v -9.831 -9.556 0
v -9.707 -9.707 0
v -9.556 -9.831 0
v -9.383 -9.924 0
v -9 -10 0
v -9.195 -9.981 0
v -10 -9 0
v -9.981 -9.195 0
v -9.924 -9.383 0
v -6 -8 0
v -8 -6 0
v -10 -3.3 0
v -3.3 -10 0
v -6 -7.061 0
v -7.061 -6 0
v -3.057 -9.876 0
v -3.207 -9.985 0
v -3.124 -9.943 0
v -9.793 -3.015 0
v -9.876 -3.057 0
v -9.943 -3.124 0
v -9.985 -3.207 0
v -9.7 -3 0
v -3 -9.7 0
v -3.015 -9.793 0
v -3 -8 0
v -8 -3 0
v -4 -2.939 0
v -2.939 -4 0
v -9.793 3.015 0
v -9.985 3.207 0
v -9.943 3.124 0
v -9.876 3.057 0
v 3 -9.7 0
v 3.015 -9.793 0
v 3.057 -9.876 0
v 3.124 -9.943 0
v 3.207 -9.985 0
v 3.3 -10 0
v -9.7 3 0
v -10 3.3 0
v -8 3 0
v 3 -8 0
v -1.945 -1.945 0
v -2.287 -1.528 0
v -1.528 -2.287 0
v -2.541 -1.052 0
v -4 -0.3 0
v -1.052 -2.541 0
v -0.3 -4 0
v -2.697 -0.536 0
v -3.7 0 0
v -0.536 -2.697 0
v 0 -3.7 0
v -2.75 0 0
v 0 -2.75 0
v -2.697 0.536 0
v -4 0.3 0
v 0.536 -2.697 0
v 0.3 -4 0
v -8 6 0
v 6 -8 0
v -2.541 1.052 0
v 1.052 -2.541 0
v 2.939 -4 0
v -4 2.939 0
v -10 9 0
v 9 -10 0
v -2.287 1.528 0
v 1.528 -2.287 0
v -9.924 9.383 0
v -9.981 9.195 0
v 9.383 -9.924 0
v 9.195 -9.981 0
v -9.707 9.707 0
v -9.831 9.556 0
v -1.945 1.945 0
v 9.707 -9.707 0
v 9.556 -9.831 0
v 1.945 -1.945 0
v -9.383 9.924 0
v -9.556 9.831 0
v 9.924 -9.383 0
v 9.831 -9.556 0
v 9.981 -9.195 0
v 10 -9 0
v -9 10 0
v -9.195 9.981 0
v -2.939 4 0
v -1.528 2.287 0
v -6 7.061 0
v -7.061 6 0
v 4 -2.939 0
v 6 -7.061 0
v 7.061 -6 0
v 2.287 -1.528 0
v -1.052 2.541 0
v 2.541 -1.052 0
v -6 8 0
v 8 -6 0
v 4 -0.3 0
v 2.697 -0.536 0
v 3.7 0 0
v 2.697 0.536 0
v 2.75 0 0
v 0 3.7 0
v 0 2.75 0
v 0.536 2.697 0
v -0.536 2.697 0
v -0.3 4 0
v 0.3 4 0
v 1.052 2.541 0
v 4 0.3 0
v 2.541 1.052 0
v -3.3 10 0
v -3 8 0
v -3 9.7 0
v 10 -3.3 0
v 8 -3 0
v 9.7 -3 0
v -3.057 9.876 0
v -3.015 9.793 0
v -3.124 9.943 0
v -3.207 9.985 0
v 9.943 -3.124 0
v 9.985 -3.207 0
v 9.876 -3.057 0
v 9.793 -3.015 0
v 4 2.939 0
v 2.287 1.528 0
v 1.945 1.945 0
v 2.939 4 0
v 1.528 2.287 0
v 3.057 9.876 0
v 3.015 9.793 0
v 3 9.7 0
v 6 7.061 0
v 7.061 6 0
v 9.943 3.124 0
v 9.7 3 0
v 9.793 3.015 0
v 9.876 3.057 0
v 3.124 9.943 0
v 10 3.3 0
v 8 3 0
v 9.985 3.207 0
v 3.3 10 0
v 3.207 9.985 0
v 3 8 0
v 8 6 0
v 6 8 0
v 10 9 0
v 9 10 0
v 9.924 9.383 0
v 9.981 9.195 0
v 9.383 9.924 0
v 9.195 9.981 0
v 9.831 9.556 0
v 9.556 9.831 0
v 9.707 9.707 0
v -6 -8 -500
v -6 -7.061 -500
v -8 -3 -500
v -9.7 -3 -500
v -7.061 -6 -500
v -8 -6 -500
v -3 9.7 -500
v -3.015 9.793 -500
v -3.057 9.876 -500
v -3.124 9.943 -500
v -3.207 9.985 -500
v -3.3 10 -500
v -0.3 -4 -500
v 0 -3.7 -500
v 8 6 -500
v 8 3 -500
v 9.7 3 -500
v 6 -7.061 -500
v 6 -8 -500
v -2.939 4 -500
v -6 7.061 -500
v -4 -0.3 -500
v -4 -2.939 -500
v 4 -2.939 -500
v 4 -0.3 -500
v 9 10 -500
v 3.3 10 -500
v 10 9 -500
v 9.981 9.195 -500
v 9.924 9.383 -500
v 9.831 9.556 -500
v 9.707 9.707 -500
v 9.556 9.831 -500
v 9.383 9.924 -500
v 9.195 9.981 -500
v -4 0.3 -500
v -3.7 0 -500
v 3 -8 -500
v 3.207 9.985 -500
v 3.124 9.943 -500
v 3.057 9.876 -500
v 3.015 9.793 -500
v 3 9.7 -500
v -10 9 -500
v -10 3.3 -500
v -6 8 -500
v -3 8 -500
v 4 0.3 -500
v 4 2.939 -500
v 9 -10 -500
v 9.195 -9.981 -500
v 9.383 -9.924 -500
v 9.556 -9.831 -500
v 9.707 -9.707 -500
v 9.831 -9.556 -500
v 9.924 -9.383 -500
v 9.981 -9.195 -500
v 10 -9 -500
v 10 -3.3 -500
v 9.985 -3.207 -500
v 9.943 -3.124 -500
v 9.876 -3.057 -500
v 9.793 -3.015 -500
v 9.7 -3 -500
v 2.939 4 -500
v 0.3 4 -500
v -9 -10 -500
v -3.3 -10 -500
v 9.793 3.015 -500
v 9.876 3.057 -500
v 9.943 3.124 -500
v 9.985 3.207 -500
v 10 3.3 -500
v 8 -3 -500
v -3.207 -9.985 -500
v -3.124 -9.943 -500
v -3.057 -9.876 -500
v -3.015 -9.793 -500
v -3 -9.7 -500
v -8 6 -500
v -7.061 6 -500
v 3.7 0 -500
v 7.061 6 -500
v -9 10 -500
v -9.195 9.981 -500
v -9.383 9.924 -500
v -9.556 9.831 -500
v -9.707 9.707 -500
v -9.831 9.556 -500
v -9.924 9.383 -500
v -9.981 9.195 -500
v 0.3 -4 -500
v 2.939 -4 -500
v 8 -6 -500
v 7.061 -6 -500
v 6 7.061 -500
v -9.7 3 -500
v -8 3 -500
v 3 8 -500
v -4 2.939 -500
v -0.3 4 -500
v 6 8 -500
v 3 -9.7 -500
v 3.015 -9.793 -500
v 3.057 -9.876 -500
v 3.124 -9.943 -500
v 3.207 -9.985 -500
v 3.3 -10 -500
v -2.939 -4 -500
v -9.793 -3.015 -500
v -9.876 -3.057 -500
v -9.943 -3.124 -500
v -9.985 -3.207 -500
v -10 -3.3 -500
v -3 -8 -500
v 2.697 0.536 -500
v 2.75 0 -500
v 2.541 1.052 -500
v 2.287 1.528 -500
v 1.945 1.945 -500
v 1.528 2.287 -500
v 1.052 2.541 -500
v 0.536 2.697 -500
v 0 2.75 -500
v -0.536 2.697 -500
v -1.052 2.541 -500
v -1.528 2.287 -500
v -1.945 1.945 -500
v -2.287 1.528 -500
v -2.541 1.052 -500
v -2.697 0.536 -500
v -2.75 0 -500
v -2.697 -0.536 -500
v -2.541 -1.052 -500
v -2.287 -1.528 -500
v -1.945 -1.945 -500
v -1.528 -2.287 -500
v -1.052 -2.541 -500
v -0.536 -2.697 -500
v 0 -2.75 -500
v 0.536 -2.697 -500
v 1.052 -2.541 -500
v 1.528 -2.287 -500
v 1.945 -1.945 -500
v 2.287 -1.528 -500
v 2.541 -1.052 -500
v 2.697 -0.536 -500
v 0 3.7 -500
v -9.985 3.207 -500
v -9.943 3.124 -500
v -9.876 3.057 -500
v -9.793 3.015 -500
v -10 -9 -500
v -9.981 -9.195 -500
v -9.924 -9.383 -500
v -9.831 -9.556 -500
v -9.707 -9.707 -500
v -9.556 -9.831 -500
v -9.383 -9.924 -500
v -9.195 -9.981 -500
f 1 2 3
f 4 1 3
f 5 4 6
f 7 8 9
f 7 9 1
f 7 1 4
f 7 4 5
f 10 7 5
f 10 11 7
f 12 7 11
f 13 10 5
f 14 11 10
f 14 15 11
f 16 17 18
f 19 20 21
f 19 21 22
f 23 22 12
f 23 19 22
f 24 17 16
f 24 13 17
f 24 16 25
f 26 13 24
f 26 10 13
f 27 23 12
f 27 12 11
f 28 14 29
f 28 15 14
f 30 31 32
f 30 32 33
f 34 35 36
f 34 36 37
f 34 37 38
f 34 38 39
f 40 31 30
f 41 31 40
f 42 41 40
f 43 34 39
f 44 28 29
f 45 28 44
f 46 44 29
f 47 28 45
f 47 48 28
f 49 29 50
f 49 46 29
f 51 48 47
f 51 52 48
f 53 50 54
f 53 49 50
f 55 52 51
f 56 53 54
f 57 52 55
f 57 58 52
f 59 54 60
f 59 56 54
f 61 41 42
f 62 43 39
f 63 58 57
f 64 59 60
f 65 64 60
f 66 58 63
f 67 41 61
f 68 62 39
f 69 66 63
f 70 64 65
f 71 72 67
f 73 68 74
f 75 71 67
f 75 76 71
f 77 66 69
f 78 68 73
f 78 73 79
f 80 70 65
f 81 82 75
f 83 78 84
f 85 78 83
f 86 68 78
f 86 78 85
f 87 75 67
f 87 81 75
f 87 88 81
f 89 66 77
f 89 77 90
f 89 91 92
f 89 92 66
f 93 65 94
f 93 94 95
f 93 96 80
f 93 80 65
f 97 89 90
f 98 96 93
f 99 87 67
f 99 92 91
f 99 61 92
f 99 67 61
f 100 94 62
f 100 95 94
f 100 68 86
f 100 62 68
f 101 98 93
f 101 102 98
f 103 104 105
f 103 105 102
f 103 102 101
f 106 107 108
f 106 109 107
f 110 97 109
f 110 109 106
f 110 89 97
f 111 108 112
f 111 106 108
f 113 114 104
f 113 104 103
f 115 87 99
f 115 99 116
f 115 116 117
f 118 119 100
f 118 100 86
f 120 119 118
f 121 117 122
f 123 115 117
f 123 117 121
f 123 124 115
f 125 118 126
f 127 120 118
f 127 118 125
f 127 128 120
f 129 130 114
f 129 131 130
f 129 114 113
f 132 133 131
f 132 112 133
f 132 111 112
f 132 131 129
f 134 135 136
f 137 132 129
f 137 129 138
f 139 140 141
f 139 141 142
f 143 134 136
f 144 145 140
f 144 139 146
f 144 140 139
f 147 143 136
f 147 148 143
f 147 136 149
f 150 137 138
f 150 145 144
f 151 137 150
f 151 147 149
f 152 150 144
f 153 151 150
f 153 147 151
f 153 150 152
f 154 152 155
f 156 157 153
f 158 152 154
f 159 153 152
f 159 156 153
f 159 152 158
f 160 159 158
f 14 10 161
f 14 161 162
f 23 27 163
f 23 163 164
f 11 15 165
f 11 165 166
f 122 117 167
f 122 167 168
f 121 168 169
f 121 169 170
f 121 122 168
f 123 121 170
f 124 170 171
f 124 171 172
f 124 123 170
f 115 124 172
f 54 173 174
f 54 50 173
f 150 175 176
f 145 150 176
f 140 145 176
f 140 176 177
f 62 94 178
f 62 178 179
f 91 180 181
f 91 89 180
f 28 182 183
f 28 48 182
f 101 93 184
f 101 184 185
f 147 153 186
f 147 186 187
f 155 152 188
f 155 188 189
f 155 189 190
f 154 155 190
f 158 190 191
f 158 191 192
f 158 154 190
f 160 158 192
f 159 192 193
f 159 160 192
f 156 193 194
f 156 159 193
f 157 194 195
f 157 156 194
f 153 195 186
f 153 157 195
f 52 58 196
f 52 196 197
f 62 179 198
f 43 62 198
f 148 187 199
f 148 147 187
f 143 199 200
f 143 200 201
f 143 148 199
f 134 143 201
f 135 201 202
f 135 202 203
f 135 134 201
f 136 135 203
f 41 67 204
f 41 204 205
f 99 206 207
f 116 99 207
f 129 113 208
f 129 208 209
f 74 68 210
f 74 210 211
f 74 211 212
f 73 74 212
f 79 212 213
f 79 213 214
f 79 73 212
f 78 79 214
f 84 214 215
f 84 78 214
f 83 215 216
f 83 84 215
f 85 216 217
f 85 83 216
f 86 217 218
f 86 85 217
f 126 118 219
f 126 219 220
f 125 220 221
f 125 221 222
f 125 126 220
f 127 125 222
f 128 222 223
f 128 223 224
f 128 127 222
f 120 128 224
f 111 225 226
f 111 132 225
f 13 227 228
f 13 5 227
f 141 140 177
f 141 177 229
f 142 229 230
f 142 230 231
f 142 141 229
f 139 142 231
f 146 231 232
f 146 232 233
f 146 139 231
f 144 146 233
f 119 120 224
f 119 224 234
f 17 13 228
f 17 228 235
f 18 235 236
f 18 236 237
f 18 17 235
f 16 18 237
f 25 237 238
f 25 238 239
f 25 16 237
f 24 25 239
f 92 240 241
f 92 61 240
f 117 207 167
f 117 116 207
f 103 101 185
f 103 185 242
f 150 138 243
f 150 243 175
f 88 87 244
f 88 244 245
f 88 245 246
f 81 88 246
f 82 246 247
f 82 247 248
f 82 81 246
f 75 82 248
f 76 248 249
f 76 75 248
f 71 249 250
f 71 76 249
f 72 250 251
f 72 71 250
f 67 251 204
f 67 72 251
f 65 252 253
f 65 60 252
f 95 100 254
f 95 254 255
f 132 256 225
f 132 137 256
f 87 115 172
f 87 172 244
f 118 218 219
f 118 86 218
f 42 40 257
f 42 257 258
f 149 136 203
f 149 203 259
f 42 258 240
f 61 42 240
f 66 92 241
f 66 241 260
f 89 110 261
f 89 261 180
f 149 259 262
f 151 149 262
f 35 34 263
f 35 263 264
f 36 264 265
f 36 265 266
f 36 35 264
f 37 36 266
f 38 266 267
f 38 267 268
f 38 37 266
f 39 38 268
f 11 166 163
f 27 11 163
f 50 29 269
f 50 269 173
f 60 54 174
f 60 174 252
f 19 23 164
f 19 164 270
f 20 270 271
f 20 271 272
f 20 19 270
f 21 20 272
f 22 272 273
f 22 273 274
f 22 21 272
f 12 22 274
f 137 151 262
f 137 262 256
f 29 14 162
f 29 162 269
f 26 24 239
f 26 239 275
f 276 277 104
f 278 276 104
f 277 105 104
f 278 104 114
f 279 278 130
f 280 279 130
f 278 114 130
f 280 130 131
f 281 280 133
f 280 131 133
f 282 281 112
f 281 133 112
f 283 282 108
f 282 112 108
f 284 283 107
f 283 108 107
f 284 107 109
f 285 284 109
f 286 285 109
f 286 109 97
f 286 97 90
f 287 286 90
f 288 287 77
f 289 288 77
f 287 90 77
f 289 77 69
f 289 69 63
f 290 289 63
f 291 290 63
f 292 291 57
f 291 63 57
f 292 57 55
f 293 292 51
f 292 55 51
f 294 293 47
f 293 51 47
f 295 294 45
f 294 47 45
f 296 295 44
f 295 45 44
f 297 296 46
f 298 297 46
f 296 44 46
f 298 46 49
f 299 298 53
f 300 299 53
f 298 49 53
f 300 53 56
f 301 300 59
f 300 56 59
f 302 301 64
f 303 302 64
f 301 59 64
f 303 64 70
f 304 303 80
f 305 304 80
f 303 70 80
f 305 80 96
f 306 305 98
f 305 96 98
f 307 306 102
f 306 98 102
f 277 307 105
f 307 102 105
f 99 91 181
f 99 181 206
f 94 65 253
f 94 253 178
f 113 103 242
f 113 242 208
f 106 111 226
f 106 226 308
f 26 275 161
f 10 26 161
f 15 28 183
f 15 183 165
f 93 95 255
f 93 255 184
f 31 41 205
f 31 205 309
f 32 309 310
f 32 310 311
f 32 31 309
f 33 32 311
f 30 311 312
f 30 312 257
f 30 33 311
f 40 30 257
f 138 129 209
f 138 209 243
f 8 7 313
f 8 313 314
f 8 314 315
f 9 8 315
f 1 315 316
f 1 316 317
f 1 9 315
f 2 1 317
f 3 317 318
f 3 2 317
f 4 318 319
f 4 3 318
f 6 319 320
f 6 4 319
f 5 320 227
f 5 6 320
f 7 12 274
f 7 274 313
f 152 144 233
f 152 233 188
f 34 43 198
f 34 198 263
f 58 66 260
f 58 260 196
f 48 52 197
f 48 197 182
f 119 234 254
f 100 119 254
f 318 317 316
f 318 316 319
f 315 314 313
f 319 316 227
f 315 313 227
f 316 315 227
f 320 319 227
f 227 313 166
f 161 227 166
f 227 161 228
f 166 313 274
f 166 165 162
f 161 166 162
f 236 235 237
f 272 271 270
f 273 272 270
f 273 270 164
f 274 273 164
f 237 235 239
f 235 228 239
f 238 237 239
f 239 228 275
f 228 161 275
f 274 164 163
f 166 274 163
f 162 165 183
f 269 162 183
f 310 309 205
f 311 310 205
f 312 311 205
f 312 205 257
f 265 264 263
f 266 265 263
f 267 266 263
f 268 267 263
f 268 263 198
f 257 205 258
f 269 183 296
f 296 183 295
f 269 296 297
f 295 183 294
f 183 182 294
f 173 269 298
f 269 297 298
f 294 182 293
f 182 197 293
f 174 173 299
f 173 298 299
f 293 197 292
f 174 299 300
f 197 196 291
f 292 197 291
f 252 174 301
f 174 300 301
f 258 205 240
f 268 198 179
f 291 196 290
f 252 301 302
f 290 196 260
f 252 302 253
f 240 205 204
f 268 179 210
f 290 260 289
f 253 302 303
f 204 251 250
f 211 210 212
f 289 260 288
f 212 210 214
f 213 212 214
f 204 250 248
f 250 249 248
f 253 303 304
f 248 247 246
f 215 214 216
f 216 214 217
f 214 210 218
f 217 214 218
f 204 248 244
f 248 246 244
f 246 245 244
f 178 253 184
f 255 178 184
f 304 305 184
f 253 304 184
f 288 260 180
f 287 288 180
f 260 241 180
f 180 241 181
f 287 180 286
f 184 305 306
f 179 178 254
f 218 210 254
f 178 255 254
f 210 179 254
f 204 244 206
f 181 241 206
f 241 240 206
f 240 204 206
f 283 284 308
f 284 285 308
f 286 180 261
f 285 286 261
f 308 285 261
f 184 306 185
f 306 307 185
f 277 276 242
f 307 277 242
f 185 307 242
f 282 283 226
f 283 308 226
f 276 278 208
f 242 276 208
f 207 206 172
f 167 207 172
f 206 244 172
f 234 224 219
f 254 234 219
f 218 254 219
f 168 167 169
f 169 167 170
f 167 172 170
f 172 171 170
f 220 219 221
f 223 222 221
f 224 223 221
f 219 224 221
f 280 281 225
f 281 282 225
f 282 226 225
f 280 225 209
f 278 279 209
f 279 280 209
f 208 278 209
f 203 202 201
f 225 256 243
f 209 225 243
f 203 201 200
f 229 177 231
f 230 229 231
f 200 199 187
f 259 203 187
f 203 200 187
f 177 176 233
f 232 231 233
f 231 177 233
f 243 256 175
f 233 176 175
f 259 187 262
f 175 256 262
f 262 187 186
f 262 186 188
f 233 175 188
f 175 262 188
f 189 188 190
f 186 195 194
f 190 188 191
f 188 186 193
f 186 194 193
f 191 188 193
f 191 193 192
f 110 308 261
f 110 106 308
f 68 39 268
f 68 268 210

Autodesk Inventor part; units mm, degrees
ref_plane "YZ Plane" through (0, 0, 0) normal (1, 0, 0) x (0, 1, 0)
ref_plane "XZ Plane" through (0, 0, 0) normal (0, 1, 0) x (-1, 0, 0)
ref_plane "XY Plane" through (0, 0, 0) normal (0, 0, 1) x (1, 0, 0)
sketch "Sketch_5" plane through (0, 0, 0) normal (0, 0, 1) x (1, 0, 0)
  line L0 (-10, 9) -> (-10, 3.3)
  arc A0 (-10, 3.3) -> (-9.7, 3) centre (-9.7, 3.3) ccw
  line L1 (-9.7, 3) -> (-8, 3)
  line L2 (-8, 3) -> (-8, 6)
  line L3 (-8, 6) -> (-7.0607, 6)
  line L4 (-7.0607, 6) -> (-4, 2.9393)
  line L5 (-4, 2.9393) -> (-4, 0.3)
  line L6 (-4, 0.3) -> (-3.7, 0)
  line L7 (-3.7, 0) -> (-4, -0.3)
  line L8 (-4, -0.3) -> (-4, -2.9393)
  line L9 (-4, -2.9393) -> (-7.0607, -6)
  line L10 (-7.0607, -6) -> (-8, -6)
  line L11 (-8, -6) -> (-8, -3)
  line L12 (-8, -3) -> (-9.7, -3)
  arc A1 (-9.7, -3) -> (-10, -3.3) centre (-9.7, -3.3) ccw
  line L13 (-10, -3.3) -> (-10, -9)
  arc A2 (-10, -9) -> (-9, -10) centre (-9, -9) ccw
  line L14 (-9, -10) -> (-3.3, -10)
  arc A3 (-3.3, -10) -> (-3, -9.7) centre (-3.3, -9.7) ccw
  line L15 (-3, -9.7) -> (-3, -8)
  line L16 (-3, -8) -> (-6, -8)
  line L17 (-6, -8) -> (-6, -7.0607)
  line L18 (-6, -7.0607) -> (-2.9393, -4)
  line L19 (-2.9393, -4) -> (-0.3, -4)
  line L20 (-0.3, -4) -> (0, -3.7)
  line L21 (0, -3.7) -> (0.3, -4)
  line L22 (0.3, -4) -> (2.9393, -4)
  line L23 (2.9393, -4) -> (6, -7.0607)
  line L24 (6, -7.0607) -> (6, -8)
  line L25 (6, -8) -> (3, -8)
  line L26 (3, -8) -> (3, -9.7)
  arc A4 (3, -9.7) -> (3.3, -10) centre (3.3, -9.7) ccw
  line L27 (3.3, -10) -> (9, -10)
  arc A5 (9, -10) -> (10, -9) centre (9, -9) ccw
  line L28 (10, -9) -> (10, -3.3)
  arc A6 (10, -3.3) -> (9.7, -3) centre (9.7, -3.3) ccw
  line L29 (9.7, -3) -> (8, -3)
  line L30 (8, -3) -> (8, -6)
  line L31 (8, -6) -> (7.0607, -6)
  line L32 (7.0607, -6) -> (4, -2.9393)
  line L33 (4, -2.9393) -> (4, -0.3)
  line L34 (4, -0.3) -> (3.7, 0)
  line L35 (3.7, 0) -> (4, 0.3)
  line L36 (4, 0.3) -> (4, 2.9393)
  line L37 (4, 2.9393) -> (7.0607, 6)
  line L38 (7.0607, 6) -> (8, 6)
  line L39 (8, 6) -> (8, 3)
  line L40 (8, 3) -> (9.7, 3)
  arc A7 (9.7, 3) -> (10, 3.3) centre (9.7, 3.3) ccw
  line L41 (10, 3.3) -> (10, 9)
  arc A8 (10, 9) -> (9, 10) centre (9, 9) ccw
  line L42 (9, 10) -> (3.3, 10)
  arc A9 (3.3, 10) -> (3, 9.7) centre (3.3, 9.7) ccw
  line L43 (3, 9.7) -> (3, 8)
  line L44 (3, 8) -> (6, 8)
  line L45 (6, 8) -> (6, 7.0607)
  line L46 (6, 7.0607) -> (2.9393, 4)
  line L47 (2.9393, 4) -> (0.3, 4)
  line L48 (0.3, 4) -> (0, 3.7)
  line L49 (0, 3.7) -> (-0.3, 4)
  line L50 (-0.3, 4) -> (-2.9393, 4)
  line L51 (-2.9393, 4) -> (-6, 7.0607)
  line L52 (-6, 7.0607) -> (-6, 8)
  line L53 (-6, 8) -> (-3, 8)
  line L54 (-3, 8) -> (-3, 9.7)
  arc A10 (-3, 9.7) -> (-3.3, 10) centre (-3.3, 9.7) ccw
  line L55 (-3.3, 10) -> (-9, 10)
  arc A11 (-9, 10) -> (-10, 9) centre (-9, 9) ccw
  circle A12 centre (0, 0) radius 2.75
  dimension "d2" = 5.5
  dimension "d3" = 10
  dimension "d4" = 10
  dimension "d5" = 5.7
  dimension "d6" = 5.7
  dimension "d7" = 1.7
  dimension "d8" = 3
  dimension "d9" = 0.3
  dimension "d10" = 90
  dimension "d11" = 45
  dimension "d12" = 45
  dimension "d13" = 45
  dimension "d14" = 90
  dimension "d15" = 90
  dimension "d16" = 45
  dimension "d17" = 45
  dimension "d18" = 45
  dimension "d19" = 45
  dimension "d20" = 90
  dimension "d21" = 90
  dimension "d22" = 45
  dimension "d23" = 45
  dimension "d24" = 90
  dimension "d25" = 90
  dimension "d26" = 90
  dimension "d27" = 90
  dimension "d28" = 90
  dimension "d29" = 90
  dimension "d30" = 90
  dimension "d31" = 90
  dimension "d32" = 90
  dimension "d33" = 90
  dimension "d34" = 90
  dimension "d35" = 90
  dimension "d36" = 90
  dimension "d37" = 90
  dimension "d38" = 90
  dimension "d39" = 4
  dimension "d40" = 6
  dimension "d41" = 13
  dimension "d42" = 14
  dimension "d43" = 16
  dimension "d44" = 18
  dimension "d45" = 3
  dimension "d46" = 9
  dimension "d47" = 7
  dimension "d48" = 1
  dimension "d49" = 7
  dimension "d50" = 1.5
  dimension "d51" = 1.8663
  dimension "d52" = 3.3663
  dimension "d53" = 1.5
  dimension "d54" = 1.8663
  dimension "d55" = 3.3663
  dimension "d56" = 4
  dimension "d57" = 10.8187
  dimension "d58" = 1.9092
  dimension "d59" = 5
  dimension "d60" = 13
  dimension "d61" = 13
  dimension "d62" = 16.0513
  dimension "d63" = 3.3234
  dimension "d64" = 14
  dimension "d65" = 12.685
extrude "Extrusion1" add sketch "Sketch_5" against normal blind 500
properties part number "Perfil_Aluminio_20x20x500"
